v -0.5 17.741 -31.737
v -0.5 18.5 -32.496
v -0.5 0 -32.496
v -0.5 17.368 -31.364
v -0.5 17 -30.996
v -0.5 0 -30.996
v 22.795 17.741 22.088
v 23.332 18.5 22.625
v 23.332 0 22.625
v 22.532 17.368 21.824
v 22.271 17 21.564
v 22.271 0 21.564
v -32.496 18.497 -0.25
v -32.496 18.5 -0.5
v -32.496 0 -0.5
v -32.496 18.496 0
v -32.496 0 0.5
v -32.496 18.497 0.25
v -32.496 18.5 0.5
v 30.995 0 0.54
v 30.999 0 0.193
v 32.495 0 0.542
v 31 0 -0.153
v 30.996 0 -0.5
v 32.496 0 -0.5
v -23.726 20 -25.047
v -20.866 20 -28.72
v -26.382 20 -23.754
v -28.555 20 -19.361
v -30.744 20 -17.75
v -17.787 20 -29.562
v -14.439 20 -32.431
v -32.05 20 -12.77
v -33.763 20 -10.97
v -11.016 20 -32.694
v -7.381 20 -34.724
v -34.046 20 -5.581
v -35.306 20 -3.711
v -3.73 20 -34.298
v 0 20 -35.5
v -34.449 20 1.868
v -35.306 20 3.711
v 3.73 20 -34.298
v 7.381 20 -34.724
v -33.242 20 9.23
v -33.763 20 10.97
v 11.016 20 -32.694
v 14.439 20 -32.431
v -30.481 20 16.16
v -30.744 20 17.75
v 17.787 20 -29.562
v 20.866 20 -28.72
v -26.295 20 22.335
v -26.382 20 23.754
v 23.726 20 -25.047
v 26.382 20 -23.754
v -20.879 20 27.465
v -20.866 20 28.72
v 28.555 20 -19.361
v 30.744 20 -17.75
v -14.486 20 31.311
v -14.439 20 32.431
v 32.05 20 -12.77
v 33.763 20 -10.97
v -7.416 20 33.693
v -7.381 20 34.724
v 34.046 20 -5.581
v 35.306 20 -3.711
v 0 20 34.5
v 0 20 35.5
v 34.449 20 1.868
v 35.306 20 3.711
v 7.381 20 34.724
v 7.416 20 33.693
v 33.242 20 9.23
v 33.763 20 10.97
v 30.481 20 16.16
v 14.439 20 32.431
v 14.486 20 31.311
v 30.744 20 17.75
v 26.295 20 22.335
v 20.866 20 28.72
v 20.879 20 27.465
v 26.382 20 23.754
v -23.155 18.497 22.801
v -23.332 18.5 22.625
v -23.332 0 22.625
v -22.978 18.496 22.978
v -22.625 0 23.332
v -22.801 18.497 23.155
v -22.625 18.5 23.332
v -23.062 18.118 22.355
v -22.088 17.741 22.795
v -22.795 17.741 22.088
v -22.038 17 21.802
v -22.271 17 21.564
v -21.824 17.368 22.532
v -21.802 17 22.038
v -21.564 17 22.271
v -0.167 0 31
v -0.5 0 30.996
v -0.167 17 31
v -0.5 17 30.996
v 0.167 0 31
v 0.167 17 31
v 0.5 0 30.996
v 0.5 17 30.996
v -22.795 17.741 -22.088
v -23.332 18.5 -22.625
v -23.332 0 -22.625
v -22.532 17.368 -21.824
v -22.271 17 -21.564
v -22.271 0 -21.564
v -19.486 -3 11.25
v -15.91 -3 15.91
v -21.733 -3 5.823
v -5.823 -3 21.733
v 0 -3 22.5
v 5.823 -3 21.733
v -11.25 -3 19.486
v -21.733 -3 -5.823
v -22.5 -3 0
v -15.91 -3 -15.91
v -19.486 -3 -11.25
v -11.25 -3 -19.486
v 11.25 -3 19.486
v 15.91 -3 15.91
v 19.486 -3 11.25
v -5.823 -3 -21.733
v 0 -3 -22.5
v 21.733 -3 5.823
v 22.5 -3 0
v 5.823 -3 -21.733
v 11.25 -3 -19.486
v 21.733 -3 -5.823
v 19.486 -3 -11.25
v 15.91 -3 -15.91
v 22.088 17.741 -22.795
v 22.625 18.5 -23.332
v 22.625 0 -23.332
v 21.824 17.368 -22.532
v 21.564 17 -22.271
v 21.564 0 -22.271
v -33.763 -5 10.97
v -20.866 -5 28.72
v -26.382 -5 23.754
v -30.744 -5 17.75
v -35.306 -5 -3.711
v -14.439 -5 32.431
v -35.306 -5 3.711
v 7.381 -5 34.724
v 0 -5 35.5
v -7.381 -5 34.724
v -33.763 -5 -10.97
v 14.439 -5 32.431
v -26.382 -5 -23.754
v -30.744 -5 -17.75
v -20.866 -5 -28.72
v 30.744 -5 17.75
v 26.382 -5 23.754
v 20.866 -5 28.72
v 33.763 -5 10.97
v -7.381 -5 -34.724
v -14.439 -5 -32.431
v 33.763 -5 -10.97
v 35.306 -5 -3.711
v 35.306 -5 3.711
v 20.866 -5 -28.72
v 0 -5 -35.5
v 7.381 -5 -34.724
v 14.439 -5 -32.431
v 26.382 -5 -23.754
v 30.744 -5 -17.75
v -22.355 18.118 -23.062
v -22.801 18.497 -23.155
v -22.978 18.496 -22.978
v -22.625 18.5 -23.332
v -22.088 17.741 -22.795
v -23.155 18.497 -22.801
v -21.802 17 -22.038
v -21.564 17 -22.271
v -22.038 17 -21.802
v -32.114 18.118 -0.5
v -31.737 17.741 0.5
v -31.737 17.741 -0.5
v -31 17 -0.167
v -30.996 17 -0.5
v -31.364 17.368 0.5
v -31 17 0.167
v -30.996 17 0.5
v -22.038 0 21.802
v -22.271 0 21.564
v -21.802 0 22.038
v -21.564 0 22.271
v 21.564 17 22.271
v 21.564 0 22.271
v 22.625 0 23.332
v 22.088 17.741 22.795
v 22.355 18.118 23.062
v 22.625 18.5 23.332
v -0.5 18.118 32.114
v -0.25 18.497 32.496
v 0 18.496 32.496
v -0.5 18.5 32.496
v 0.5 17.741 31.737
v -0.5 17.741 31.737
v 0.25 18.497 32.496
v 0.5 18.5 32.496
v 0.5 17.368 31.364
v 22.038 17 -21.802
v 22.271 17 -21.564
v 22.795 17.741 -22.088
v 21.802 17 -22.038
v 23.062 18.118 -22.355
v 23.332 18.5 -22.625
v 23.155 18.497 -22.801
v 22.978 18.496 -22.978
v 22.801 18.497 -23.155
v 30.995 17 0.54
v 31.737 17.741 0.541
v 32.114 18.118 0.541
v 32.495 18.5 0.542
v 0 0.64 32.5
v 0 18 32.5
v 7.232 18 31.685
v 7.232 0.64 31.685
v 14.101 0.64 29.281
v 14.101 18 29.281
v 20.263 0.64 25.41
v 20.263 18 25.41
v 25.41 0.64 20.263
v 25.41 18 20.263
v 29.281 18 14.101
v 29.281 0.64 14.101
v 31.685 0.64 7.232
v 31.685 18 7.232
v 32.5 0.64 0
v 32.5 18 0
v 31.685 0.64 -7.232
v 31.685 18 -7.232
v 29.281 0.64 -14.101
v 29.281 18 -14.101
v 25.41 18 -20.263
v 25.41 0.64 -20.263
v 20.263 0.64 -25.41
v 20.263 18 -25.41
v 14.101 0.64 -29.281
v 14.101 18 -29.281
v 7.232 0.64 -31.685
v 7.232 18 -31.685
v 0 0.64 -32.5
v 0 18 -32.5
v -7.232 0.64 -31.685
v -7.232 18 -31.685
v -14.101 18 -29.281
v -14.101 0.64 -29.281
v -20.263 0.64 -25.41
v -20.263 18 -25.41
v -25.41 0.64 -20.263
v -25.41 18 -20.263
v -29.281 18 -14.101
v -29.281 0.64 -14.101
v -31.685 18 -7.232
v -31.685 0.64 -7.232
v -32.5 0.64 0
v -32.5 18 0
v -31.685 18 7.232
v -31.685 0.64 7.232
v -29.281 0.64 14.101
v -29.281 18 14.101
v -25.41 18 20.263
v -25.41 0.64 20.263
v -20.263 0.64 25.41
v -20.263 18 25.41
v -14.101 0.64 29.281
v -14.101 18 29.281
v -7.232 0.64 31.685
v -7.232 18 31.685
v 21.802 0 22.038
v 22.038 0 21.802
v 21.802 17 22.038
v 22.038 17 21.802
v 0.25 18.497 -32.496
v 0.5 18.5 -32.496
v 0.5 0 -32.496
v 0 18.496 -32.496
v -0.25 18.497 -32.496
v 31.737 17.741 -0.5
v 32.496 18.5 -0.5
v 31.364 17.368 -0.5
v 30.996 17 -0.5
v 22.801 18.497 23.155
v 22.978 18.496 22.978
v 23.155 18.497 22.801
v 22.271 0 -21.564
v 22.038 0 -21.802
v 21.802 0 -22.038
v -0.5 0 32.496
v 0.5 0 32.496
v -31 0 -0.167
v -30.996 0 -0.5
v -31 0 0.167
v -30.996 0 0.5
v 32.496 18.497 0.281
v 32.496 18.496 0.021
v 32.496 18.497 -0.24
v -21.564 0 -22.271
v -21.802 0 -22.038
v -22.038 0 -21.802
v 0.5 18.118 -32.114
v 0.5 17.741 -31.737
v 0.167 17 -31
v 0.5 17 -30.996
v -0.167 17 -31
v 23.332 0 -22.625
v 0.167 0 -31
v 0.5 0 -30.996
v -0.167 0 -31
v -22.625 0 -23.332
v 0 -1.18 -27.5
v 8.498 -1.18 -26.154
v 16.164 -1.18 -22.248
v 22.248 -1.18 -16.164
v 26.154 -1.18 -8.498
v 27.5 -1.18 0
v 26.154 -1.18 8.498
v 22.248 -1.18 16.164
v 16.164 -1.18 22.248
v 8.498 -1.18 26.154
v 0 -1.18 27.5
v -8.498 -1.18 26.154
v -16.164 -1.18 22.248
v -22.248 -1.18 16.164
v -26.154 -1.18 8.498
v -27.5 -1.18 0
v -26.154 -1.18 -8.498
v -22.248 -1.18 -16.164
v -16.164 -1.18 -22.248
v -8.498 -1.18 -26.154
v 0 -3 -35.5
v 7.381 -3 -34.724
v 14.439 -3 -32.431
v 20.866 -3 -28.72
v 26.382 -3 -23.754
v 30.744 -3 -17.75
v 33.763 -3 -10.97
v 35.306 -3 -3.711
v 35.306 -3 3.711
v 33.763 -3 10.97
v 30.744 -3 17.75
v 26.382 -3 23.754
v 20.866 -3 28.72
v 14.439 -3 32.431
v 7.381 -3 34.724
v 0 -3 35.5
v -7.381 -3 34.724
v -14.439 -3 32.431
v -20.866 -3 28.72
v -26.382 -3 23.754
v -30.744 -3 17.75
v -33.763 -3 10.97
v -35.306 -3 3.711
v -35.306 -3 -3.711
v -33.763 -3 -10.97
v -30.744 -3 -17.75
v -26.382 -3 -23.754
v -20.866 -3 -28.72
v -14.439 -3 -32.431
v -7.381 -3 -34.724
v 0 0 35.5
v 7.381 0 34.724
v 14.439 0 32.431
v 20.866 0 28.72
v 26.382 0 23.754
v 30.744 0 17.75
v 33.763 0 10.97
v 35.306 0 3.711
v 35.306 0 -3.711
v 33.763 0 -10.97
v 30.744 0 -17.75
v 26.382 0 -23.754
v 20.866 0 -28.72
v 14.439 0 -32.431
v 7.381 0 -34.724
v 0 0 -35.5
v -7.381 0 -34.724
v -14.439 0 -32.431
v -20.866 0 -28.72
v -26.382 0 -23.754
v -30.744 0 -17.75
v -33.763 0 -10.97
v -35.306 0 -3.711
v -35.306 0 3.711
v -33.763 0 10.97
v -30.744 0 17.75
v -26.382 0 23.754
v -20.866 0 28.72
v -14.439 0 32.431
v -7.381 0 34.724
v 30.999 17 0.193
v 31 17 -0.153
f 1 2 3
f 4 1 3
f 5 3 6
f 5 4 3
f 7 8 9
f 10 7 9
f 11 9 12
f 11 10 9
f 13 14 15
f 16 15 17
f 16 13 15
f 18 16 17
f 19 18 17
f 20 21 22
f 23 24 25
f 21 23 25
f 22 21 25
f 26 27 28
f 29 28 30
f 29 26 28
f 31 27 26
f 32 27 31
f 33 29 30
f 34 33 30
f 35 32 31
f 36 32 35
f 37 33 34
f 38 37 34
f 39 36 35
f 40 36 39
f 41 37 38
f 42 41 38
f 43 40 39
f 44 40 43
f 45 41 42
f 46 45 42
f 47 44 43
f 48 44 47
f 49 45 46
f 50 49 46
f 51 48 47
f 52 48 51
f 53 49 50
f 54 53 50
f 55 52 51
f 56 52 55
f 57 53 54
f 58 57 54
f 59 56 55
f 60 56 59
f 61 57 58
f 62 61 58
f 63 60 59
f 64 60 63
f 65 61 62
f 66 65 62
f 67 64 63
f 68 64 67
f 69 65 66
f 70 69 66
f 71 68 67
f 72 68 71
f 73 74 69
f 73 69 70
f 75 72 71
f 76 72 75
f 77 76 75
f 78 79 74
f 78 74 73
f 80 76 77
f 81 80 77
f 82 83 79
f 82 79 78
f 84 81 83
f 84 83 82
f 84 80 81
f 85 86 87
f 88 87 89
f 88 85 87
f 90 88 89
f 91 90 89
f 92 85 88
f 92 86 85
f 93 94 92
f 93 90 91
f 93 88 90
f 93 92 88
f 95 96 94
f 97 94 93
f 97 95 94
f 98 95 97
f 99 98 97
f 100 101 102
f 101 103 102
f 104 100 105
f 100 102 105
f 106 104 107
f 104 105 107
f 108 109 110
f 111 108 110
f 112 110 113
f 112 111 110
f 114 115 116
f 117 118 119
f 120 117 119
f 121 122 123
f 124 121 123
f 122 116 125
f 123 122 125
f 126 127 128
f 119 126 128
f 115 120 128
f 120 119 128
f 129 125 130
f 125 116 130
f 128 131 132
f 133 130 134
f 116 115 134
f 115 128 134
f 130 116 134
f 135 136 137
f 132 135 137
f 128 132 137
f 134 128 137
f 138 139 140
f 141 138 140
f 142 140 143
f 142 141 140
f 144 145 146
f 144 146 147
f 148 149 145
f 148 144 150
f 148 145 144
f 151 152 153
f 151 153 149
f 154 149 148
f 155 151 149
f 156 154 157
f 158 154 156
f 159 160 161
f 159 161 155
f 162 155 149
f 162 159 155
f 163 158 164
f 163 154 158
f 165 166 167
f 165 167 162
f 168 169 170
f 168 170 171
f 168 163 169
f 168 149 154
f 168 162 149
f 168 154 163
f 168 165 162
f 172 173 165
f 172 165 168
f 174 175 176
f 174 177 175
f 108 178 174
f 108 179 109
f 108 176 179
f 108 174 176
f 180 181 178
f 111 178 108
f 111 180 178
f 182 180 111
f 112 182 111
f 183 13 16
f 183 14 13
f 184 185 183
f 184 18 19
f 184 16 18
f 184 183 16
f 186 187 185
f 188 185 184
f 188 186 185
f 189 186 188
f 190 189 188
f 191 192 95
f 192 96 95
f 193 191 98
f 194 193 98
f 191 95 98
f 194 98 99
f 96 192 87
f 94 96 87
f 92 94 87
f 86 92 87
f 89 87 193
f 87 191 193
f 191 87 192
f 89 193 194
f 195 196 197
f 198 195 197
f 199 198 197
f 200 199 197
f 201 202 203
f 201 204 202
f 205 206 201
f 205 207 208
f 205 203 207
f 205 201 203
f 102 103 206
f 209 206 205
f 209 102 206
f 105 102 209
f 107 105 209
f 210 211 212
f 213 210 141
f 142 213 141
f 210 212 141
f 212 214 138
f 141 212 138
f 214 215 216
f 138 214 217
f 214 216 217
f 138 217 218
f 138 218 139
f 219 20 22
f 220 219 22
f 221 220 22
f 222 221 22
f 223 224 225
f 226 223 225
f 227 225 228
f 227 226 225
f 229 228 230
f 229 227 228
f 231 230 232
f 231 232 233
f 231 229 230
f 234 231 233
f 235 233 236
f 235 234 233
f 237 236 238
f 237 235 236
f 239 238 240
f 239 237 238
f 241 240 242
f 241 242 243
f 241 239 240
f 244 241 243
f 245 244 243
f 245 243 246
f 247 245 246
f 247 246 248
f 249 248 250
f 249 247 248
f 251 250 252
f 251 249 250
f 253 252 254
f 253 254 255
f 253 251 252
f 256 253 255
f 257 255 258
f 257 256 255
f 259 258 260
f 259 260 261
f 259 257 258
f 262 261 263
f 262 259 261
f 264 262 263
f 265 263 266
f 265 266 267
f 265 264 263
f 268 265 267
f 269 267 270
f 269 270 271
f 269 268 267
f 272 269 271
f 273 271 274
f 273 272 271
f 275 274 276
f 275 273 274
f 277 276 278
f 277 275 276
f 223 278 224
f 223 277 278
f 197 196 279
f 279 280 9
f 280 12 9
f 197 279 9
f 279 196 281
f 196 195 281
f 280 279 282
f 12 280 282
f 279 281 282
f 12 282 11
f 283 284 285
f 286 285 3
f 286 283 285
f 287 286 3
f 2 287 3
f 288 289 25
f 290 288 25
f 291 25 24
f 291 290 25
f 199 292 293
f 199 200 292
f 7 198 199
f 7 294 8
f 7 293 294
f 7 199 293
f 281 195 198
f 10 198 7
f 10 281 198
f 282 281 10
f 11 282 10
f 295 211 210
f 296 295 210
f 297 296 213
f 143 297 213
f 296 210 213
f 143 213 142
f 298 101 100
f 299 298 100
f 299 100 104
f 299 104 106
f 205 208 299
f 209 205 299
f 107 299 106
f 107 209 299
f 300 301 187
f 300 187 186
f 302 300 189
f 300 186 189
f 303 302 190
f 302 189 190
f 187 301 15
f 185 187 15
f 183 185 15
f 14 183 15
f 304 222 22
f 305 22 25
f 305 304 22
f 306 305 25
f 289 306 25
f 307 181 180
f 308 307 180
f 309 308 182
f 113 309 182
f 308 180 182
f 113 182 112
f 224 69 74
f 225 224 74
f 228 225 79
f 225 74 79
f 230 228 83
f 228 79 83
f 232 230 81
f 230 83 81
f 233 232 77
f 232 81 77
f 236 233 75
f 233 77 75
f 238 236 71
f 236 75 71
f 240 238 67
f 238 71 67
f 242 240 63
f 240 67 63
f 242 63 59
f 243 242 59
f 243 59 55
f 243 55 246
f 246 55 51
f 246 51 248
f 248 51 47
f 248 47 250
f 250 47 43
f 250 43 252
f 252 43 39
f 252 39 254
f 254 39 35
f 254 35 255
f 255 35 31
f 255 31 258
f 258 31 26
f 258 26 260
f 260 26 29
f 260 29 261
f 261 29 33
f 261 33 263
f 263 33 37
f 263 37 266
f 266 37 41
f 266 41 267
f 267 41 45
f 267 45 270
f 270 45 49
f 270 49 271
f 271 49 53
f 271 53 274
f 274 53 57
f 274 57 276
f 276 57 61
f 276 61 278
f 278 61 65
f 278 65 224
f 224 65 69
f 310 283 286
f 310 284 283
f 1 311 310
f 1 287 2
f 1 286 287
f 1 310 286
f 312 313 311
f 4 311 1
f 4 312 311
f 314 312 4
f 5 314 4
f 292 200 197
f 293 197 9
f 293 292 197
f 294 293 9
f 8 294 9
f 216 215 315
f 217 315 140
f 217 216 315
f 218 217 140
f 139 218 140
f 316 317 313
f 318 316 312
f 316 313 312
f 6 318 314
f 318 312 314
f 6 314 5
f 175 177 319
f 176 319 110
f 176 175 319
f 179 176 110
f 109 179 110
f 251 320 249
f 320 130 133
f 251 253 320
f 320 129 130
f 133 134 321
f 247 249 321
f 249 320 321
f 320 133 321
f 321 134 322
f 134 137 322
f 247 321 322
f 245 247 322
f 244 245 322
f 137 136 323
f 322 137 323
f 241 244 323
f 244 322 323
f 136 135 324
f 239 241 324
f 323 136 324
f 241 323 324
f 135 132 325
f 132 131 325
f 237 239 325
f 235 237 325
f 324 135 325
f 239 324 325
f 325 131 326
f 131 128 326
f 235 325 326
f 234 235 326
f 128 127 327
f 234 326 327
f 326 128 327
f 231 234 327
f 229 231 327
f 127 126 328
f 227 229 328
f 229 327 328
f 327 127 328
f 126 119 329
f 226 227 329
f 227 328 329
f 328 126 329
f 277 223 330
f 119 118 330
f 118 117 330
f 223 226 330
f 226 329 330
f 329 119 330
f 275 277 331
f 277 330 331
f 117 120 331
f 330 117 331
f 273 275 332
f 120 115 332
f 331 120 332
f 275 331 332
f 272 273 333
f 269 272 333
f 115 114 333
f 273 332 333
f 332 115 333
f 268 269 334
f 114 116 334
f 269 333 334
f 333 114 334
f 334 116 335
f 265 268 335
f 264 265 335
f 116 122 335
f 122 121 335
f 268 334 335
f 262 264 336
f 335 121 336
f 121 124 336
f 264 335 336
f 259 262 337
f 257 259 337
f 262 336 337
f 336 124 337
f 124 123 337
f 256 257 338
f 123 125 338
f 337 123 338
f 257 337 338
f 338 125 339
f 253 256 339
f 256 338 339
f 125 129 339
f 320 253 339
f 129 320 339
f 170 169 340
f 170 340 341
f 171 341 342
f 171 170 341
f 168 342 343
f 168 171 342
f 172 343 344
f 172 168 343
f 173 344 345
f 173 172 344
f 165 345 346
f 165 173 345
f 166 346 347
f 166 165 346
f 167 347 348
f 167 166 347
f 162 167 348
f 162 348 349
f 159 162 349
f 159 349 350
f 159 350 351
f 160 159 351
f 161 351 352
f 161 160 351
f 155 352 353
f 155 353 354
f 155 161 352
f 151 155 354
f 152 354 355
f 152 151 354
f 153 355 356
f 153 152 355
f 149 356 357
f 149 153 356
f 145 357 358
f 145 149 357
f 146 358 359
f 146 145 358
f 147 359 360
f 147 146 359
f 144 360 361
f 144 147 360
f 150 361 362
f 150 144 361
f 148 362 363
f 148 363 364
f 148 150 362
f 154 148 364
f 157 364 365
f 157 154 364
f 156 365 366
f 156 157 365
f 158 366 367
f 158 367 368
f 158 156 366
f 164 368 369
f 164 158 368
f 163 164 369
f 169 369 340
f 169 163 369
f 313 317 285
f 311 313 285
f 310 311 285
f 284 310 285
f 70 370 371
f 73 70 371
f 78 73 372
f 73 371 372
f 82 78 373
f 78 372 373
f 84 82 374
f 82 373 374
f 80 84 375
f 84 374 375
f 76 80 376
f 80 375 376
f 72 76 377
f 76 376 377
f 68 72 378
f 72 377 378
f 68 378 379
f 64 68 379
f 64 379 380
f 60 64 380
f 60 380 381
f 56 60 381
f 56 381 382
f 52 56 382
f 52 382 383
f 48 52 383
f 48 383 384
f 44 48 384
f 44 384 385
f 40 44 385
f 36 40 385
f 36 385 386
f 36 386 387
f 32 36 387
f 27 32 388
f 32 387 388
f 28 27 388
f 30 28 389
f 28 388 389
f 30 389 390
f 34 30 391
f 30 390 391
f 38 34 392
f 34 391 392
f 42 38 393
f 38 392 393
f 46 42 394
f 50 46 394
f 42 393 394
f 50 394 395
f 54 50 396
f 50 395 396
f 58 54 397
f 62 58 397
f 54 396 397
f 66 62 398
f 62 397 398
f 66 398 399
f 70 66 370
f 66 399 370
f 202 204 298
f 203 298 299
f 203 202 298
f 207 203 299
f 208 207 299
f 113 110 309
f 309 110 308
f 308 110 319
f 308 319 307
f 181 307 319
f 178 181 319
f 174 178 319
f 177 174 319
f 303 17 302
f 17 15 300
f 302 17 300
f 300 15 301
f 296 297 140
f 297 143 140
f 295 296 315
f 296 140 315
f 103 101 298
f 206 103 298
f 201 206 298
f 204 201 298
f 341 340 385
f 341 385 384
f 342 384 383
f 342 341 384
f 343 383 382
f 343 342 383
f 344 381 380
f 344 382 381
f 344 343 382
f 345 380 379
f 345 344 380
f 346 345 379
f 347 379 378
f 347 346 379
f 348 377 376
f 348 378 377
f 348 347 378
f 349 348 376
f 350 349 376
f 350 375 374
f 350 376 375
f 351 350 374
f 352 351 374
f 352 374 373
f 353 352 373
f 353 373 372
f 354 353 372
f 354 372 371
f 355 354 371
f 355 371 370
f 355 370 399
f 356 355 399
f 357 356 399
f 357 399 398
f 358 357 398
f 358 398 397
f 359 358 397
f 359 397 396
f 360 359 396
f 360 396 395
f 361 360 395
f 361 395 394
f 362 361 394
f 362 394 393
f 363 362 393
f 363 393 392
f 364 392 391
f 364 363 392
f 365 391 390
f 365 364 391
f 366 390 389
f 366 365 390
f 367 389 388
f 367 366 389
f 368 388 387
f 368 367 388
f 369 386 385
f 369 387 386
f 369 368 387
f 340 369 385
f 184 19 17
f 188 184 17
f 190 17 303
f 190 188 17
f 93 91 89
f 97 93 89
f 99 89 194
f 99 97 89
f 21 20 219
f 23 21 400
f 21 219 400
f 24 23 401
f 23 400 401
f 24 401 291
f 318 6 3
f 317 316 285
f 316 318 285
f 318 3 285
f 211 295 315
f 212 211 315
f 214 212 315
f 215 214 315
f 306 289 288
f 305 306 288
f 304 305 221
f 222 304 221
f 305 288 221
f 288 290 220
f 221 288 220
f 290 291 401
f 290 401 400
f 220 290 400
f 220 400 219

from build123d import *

# Parameters (mm, degrees)
SKETCH1_R           = 35.5
SKETCH1_R_2         = 32.5
BOSS_EXTRUDE1_DEPTH = 20
BOSS_EXTRUDE2_DEPTH = 20
SKETCH3_R           = 31
CUT_EXTRUDE1_DEPTH  = 20
CHAMFER1_SIZE       = 2
CHAMFER2_SIZE       = 3
CHAMFER3_SIZE       = 3
CHAMFER4_SIZE       = 3
CHAMFER5_SIZE       = 3
CHAMFER6_SIZE       = 3
CHAMFER7_SIZE       = 3
CHAMFER8_SIZE       = 3
CHAMFER9_SIZE       = 3
BOSS_EXTRUDE5_START = 3
SKETCH4_R           = 35.5
SKETCH4_R_2         = 32.5
BOSS_EXTRUDE5_DEPTH = 3
BOSS_EXTRUDE6_START = 2
SKETCH5_R           = 35.5
BOSS_EXTRUDE6_DEPTH = 2


with BuildPart() as part:
    # Sketch1 → Boss-Extrude1 (new body)
    with BuildSketch(Plane(origin=(0, 0, 0), x_dir=(1, 0, 0), z_dir=(0, 1, 0))):
        with Locations(Location((0, 0, 0), (0, 0, 270))):
            Circle(SKETCH1_R)
        with Locations(Location((0, 0, 0), (0, 0, 270))):
            Circle(SKETCH1_R_2, mode=Mode.SUBTRACT)
    extrude(amount=BOSS_EXTRUDE1_DEPTH)

    # Chamfer1
    chamfer1_edges = [part.edges().sort_by_distance(p)[0] for p in [
        (0, 20, -32.5),
    ]]
    chamfer(chamfer1_edges, length=CHAMFER1_SIZE)

    # Sketch4 → Boss-Extrude5 (add)
    with BuildSketch(Plane.XZ.offset(BOSS_EXTRUDE5_START)):
        with Locations(Location((0, 0, 0), (0, 0, 270))):
            Circle(SKETCH4_R)
        with Locations(Location((0, 0, 0), (0, 0, 270))):
            Circle(SKETCH4_R_2, mode=Mode.SUBTRACT)
    extrude(amount=-BOSS_EXTRUDE5_DEPTH)

    # Sketch5 → Boss-Extrude6 (add)
    with BuildSketch(Plane.XZ.offset(3).offset(BOSS_EXTRUDE6_START)):
        with Locations(Location((0, 0, 0), (0, 0, 270))):
            Circle(SKETCH5_R)
    extrude(amount=-BOSS_EXTRUDE6_DEPTH)

    # Chamfer10
    # the kernel refuses this chamfer: 10, 3.639702343 mm, written as the material it adds along each edge
    with BuildSketch(Plane(origin=(0, -3, 0), x_dir=(0, 0, -1), z_dir=(-1, 0, 0))) as chamfer10_piece_1:
        with BuildLine():
            Line((32.875877048, -3.7765104), (22.124122952, 0.136808057))
            Line((22.124122952, 0.136808057), (22.124122952, 0.336808057))
            ThreePointArc((22.124122952, 0.336808057), (27.312061476, 0.2), (32.5, 0.2))
            Line((32.5, 0.2), (32.7, 0))
            ThreePointArc((32.7, 0), (32.7, -1.8882552), (33.075877048, -3.7765104))
            Line((33.075877048, -3.7765104), (32.875877048, -3.7765104))
        make_face()
    revolve(axis=Axis((0, -3, 0), (0, -1, 0)))


with BuildPart() as body_2:
    # Sketch2 → Boss-Extrude2 (new body)
    with BuildSketch(Plane(origin=(0, 20, 0), x_dir=(1, 0, 0), z_dir=(0, 1, 0))):
        Polygon((22.624697196, 23.331803977), (0.5, 1.207106781), (0.5, 32.496153619), (-0.5, 32.496153619), (-0.5, 1.207106781), (-22.624697196, 23.331803977), (-23.331803977, 22.624697196), (-1.207106781, 0.5), (-32.496153619, 0.5), (-32.496153619, -0.5), (-1.207106781, -0.5), (-23.331803977, -22.624697196), (-22.624697196, -23.331803977), (-0.5, -1.207106781), (-0.5, -32.496153619), (0.5, -32.496153619), (0.5, -1.207106781), (22.624697196, -23.331803977), (23.331803977, -22.624697196), (1.207106781, -0.5), (32.495485798, -0.541666667), (32.496153619, 0.5), (1.207106781, 0.5), (23.331803977, 22.624697196), align=None)
    extrude(amount=-BOSS_EXTRUDE2_DEPTH)

    # Sketch3 → Cut-Extrude1 (cut)
    with BuildSketch(Plane(origin=(0, 20, 0), x_dir=(1, 0, 0), z_dir=(0, 1, 0))):
        Circle(SKETCH3_R)
    extrude(amount=-CUT_EXTRUDE1_DEPTH, mode=Mode.SUBTRACT)


with BuildPart() as cut_extrude1_piece_1:
    # of the separate pieces the step leaves, piece 1, a body of its own (cut_extrude1_pieces)
    add(body_2.part.solids().sort_by_distance((32.496153619, 20, -0.5))[0])

    # Chamfer4
    # the kernel refuses this chamfer: 3 mm, written as the material it takes off along each edge
    with BuildSketch(Plane(origin=(0, 20, 0), x_dir=(0.9650918920852939, 0, -0.26191151145229885), z_dir=(-0.26191151145229885, 0, -0.9650918920852939))) as chamfer4_piece_1:
        Polygon((31 + CHAMFER4_SIZE, 0), (31, CHAMFER4_SIZE), (31, 0), align=None)
    revolve(axis=Axis((0, 20, 0), (0, -1, 0)), revolution_arc=30.440357856, mode=Mode.SUBTRACT)


with BuildPart() as cut_extrude1_piece_2:
    # of the separate pieces the step leaves, piece 2, a body of its own (cut_extrude1_pieces)
    add(body_2.part.solids().sort_by_distance((23.331803977, 20, 22.624697196))[0])

    # Chamfer5
    # the kernel refuses this chamfer: 3 mm, written as the material it takes off along each edge
    with BuildSketch(Plane(origin=(0, 20, 0), x_dir=(0.4972236185024376, 0, 0.8676224254843476), z_dir=(-0.8676224254843476, 0, 0.4972236185024376))) as chamfer5_piece_1:
        Polygon((31 + CHAMFER5_SIZE, 0), (31, -CHAMFER5_SIZE), (31, 0), align=None)
    revolve(axis=Axis((0, 20, 0), (0, 1, 0)), revolution_arc=30.367029113, mode=Mode.SUBTRACT)


with BuildPart() as cut_extrude1_piece_3:
    # of the separate pieces the step leaves, piece 3, a body of its own (cut_extrude1_pieces)
    add(body_2.part.solids().sort_by_distance((-21.563905404, 20, -22.271012185))[0])

    # Chamfer9
    # the kernel refuses this chamfer: 3 mm, written as the material it takes off along each edge
    with BuildSketch(Plane(origin=(0, 20, 0), x_dir=(-0.4972236185024667, 0, -0.867622425484331), z_dir=(0.867622425484331, 0, -0.4972236185024667))) as chamfer9_piece_1:
        Polygon((31 + CHAMFER9_SIZE, 0), (31, -CHAMFER9_SIZE), (31, 0), align=None)
    revolve(axis=Axis((0, 20, 0), (0, 1, 0)), revolution_arc=30.367029113, mode=Mode.SUBTRACT)


with BuildPart() as cut_extrude1_piece_4:
    # of the separate pieces the step leaves, piece 4, a body of its own (cut_extrude1_pieces)
    add(body_2.part.solids().sort_by_distance((-30.99596748, 20, -0.5))[0])

    # Chamfer8
    # the kernel refuses this chamfer: 3 mm, written as the material it takes off along each edge
    with BuildSketch(Plane(origin=(0, 20, 0), x_dir=(-0.965091892978687, 0, -0.2619115081603219), z_dir=(0.2619115081603219, 0, -0.965091892978687))) as chamfer8_piece_1:
        Polygon((31 + CHAMFER8_SIZE, 0), (31, -CHAMFER8_SIZE), (31, 0), align=None)
    revolve(axis=Axis((0, 20, 0), (0, 1, 0)), revolution_arc=30.367029113, mode=Mode.SUBTRACT)


with BuildPart() as cut_extrude1_piece_5:
    # of the separate pieces the step leaves, piece 5, a body of its own (cut_extrude1_pieces)
    add(body_2.part.solids().sort_by_distance((0.5, 20, -30.99596748))[0])

    # Chamfer2
    # the kernel refuses this chamfer: 3 mm, written as the material it takes off along each edge
    with BuildSketch(Plane(origin=(0, 20, 0), x_dir=(0.26191150816029163, 0, -0.9650918929786952), z_dir=(0.9650918929786952, 0, 0.26191150816029163))) as chamfer2_piece_1:
        Polygon((31 + CHAMFER2_SIZE, 0), (31, -CHAMFER2_SIZE), (31, 0), align=None)
    revolve(axis=Axis((0, 20, 0), (0, 1, 0)), revolution_arc=30.367029113, mode=Mode.SUBTRACT)


with BuildPart() as cut_extrude1_piece_6:
    # of the separate pieces the step leaves, piece 6, a body of its own (cut_extrude1_pieces)
    add(body_2.part.solids().sort_by_distance((0.5, 20, 32.496153619))[0])

    # Chamfer6
    # the kernel refuses this chamfer: 3 mm, written as the material it takes off along each edge
    with BuildSketch(Plane(origin=(0, 20, 0), x_dir=(-0.26191150816025044, 0, 0.9650918929787065), z_dir=(-0.9650918929787065, 0, -0.26191150816025044))) as chamfer6_piece_1:
        Polygon((31 + CHAMFER6_SIZE, 0), (31, -CHAMFER6_SIZE), (31, 0), align=None)
    revolve(axis=Axis((0, 20, 0), (0, 1, 0)), revolution_arc=30.367029113, mode=Mode.SUBTRACT)


with BuildPart() as cut_extrude1_piece_7:
    # of the separate pieces the step leaves, piece 7, a body of its own (cut_extrude1_pieces)
    add(body_2.part.solids().sort_by_distance((-22.271012185, 20, 21.563905404))[0])

    # Chamfer7
    # the kernel refuses this chamfer: 3 mm, written as the material it takes off along each edge
    with BuildSketch(Plane(origin=(0, 20, 0), x_dir=(-0.867622425484322, 0, 0.49722361850248237), z_dir=(-0.49722361850248237, 0, -0.867622425484322))) as chamfer7_piece_1:
        Polygon((31 + CHAMFER7_SIZE, 0), (31, -CHAMFER7_SIZE), (31, 0), align=None)
    revolve(axis=Axis((0, 20, 0), (0, 1, 0)), revolution_arc=30.367029113, mode=Mode.SUBTRACT)


with BuildPart() as cut_extrude1_piece_8:
    # of the separate pieces the step leaves, piece 8, a body of its own (cut_extrude1_pieces)
    add(body_2.part.solids().sort_by_distance((22.624697196, 20, -23.331803977))[0])

    # Chamfer3
    # the kernel refuses this chamfer: 3 mm, written as the material it takes off along each edge
    with BuildSketch(Plane(origin=(0, 20, 0), x_dir=(0.8676224254843233, 0, -0.49722361850248004), z_dir=(0.49722361850248004, 0, 0.8676224254843233))) as chamfer3_piece_1:
        Polygon((31, -CHAMFER3_SIZE), (31 + CHAMFER3_SIZE, 0), (31, 0), align=None)
    revolve(axis=Axis((0, 20, 0), (0, 1, 0)), revolution_arc=30.367029113, mode=Mode.SUBTRACT)


solid = Compound([part.part, cut_extrude1_piece_1.part, cut_extrude1_piece_2.part, cut_extrude1_piece_3.part, cut_extrude1_piece_4.part, cut_extrude1_piece_5.part, cut_extrude1_piece_6.part, cut_extrude1_piece_7.part, cut_extrude1_piece_8.part])
